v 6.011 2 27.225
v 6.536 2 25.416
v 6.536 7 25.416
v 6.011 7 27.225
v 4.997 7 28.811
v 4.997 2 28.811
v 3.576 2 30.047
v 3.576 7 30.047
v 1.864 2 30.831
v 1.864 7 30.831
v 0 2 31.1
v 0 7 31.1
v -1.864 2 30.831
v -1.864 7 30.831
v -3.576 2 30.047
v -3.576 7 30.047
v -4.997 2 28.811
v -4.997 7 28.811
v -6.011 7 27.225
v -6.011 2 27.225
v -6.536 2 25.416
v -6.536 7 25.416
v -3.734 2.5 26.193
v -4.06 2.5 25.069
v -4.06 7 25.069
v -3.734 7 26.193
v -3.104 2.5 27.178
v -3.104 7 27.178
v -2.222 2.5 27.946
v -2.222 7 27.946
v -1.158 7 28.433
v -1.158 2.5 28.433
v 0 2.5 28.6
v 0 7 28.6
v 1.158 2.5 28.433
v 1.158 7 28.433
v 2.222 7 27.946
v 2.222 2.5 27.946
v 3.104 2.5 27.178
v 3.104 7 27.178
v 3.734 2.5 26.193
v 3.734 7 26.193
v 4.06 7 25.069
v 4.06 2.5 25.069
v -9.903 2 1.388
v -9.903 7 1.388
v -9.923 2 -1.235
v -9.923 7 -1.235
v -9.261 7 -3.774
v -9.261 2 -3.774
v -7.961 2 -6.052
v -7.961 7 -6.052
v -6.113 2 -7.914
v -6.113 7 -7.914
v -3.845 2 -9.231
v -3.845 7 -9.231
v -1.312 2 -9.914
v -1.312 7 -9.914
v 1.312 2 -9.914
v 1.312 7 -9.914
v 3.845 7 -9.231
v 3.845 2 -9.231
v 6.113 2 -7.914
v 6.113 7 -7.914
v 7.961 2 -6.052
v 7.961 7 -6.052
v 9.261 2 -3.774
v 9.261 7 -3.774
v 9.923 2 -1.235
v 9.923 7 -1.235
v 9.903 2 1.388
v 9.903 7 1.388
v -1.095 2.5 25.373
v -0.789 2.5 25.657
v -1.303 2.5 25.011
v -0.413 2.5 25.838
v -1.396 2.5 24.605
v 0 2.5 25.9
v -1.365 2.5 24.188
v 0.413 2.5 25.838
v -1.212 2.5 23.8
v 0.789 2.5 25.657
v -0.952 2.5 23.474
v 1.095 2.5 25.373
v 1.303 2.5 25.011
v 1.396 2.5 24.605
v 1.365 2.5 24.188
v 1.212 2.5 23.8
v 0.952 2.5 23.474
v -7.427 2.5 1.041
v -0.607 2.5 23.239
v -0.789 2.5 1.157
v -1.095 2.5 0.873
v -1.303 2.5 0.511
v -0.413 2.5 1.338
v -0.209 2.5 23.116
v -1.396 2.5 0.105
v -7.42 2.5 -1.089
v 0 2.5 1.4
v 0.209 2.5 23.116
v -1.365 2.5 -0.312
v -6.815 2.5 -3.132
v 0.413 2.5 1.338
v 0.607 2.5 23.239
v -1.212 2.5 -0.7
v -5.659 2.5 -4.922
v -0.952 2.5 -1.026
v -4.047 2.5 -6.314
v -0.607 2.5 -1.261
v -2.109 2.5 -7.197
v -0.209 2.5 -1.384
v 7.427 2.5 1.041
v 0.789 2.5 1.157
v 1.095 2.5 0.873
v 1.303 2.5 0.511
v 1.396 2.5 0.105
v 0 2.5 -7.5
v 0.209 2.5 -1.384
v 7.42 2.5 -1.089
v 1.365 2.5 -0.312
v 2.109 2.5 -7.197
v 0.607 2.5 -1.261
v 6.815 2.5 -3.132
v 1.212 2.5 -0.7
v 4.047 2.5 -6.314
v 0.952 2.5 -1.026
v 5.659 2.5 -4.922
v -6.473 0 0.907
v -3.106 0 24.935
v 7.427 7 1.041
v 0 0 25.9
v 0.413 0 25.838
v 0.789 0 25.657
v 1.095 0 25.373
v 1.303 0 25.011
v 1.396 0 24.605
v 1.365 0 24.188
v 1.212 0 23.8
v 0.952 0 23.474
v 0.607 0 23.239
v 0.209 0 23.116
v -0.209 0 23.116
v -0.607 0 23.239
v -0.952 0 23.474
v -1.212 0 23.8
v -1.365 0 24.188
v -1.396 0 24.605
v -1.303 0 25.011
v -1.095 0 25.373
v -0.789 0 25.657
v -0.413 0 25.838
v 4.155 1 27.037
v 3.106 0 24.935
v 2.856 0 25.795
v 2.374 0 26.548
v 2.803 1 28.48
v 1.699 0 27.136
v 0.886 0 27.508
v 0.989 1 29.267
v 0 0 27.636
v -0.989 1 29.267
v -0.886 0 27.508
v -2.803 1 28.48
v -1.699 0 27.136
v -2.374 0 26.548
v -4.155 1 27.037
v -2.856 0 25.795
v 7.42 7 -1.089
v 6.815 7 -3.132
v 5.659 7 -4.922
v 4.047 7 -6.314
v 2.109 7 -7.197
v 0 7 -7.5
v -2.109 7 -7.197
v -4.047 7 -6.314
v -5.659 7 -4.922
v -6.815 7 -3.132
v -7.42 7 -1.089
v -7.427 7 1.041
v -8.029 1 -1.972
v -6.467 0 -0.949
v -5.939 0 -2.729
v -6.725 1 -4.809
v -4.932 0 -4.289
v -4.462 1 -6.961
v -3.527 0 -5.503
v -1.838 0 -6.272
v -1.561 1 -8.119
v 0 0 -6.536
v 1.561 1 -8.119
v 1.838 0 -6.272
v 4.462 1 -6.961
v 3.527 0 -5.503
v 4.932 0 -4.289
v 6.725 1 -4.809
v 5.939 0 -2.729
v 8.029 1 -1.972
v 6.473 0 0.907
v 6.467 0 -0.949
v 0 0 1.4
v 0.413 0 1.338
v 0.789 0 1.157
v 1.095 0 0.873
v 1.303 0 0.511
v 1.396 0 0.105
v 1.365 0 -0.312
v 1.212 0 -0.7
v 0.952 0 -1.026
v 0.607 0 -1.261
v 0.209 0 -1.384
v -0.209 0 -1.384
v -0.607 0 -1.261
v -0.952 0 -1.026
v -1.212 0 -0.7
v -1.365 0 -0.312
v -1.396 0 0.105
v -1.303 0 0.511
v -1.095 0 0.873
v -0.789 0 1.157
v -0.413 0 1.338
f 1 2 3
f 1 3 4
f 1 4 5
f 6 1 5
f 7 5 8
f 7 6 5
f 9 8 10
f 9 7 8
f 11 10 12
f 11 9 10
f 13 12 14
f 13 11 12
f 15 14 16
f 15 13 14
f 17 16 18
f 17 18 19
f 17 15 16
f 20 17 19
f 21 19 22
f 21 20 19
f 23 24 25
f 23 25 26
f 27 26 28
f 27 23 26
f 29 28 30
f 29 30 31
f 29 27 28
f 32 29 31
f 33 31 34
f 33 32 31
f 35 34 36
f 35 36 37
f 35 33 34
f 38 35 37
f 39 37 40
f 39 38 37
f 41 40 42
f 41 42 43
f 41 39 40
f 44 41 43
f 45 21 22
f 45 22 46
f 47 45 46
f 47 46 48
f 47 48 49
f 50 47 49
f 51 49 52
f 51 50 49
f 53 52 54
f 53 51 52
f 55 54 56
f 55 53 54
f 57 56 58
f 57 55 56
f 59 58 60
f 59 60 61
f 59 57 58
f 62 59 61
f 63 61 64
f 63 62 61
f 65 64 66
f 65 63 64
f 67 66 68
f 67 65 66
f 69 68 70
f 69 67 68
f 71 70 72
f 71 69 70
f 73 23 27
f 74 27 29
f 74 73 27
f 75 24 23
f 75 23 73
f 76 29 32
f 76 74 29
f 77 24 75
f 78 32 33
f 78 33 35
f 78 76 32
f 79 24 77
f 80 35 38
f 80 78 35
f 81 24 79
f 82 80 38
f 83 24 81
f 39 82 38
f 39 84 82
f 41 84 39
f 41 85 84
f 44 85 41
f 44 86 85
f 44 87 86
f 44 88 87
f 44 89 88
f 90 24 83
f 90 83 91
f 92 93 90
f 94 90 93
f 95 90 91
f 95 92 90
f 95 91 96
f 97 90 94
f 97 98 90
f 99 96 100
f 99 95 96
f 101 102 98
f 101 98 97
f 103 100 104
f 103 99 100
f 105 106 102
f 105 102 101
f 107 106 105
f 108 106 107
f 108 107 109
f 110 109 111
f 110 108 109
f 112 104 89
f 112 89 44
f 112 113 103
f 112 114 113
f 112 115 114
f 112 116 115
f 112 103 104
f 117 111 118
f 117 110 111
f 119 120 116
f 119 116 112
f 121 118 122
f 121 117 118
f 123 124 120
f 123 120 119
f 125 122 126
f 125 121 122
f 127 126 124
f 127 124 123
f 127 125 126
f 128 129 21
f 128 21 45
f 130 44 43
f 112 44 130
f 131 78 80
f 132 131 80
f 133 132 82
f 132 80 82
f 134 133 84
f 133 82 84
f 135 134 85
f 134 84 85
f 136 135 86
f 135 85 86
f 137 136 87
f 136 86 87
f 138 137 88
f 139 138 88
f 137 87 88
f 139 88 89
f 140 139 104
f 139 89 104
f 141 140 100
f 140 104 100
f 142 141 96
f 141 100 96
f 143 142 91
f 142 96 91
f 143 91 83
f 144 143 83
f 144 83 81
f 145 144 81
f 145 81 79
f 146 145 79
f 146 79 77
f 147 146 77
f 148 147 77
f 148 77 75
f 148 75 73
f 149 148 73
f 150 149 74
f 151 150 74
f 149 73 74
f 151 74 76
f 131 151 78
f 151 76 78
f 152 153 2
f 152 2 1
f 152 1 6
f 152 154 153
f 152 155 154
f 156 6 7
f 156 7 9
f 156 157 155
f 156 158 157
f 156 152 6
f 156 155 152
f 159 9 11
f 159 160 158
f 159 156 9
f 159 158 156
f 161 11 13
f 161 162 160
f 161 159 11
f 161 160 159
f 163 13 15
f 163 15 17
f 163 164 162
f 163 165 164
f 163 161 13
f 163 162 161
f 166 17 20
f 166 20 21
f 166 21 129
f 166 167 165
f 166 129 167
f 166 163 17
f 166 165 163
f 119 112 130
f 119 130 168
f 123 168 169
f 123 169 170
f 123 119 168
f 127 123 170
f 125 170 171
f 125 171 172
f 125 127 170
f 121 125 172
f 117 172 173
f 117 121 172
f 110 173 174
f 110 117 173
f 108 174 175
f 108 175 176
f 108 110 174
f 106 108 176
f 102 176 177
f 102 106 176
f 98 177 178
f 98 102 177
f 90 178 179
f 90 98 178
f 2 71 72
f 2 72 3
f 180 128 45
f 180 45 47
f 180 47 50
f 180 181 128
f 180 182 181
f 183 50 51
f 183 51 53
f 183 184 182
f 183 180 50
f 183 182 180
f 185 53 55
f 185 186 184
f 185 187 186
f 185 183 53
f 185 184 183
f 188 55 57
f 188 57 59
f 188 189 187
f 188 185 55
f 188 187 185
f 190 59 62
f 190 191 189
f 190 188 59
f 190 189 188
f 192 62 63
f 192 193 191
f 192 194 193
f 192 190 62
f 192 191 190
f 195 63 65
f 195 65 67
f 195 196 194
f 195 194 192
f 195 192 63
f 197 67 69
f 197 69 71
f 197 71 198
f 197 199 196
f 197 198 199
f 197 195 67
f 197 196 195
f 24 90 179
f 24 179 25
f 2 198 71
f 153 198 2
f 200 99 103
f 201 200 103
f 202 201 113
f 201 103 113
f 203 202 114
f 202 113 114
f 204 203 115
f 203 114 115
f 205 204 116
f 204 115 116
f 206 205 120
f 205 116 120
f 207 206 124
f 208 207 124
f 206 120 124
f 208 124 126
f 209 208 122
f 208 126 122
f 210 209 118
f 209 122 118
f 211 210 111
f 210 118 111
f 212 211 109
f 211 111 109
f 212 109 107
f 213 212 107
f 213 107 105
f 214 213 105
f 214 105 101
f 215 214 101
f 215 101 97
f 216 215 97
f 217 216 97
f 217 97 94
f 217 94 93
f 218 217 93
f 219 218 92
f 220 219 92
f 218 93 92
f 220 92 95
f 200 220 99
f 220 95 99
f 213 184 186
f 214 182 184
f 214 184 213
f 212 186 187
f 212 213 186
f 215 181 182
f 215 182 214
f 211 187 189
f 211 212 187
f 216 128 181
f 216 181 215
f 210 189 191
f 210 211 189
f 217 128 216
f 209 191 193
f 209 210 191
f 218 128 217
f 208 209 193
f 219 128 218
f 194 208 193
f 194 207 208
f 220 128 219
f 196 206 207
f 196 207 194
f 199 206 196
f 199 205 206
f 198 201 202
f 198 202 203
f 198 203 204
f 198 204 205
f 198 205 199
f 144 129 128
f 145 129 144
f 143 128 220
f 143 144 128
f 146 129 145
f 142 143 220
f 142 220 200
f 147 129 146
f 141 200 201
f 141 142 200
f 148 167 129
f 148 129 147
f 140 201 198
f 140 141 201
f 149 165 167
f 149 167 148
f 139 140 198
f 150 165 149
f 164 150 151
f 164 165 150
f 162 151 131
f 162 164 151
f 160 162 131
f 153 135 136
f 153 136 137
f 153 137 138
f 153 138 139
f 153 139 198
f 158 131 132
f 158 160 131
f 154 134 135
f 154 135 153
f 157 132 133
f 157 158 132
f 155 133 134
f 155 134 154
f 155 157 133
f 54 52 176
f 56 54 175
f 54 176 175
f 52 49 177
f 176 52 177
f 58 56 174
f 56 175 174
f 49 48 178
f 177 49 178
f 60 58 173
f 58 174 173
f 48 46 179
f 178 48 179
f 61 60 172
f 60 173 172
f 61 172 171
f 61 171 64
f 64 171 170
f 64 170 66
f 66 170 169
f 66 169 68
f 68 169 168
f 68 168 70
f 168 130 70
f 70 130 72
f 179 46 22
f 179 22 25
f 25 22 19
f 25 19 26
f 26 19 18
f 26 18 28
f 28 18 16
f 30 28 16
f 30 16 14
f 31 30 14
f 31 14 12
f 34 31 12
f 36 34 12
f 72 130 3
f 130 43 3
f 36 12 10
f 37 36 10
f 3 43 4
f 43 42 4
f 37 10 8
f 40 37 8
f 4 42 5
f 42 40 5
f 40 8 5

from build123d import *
from OCP.BRepFilletAPI import BRepFilletAPI_MakeChamfer

# Parameters (mm, degrees)
BOSS_EXTRUDE1_DEPTH = 2.5
BOSS_EXTRUDE2_DEPTH = 7
SKETCH3_R           = 1.4
CUT_EXTRUDE1_DEPTH  = 2.5
CHAMFER1_SIZE       = 2
CHAMFER1_SIZE2      = 3.464101615


with BuildPart() as part:
    # Sketch1 → Boss-Extrude1 (new body)
    with BuildSketch(Plane(origin=(0, 0, 0), x_dir=(1, 0, 0), z_dir=(0, 1, 0))):
        with BuildLine():
            Line((-7.427428988, -1.040816327), (-4.060327847, -25.068979592))
            ThreePointArc((-4.060327847, -25.068979592), (0, -28.6), (4.060327847, -25.068979592))
            Line((4.060327847, -25.068979592), (7.427428988, -1.040816327))
            ThreePointArc((7.427428988, -1.040816327), (0, 7.5), (-7.427428988, -1.040816327))
        make_face()
    extrude(amount=BOSS_EXTRUDE1_DEPTH)

    # Sketch2 → Boss-Extrude2 (add)
    with BuildSketch(Plane.XZ):
        with BuildLine():
            Line((9.903238651, 1.387755102), (6.53613751, 25.415918367))
            ThreePointArc((6.53613751, 25.415918367), (0, 31.1), (-6.53613751, 25.415918367))
            Line((-6.53613751, 25.415918367), (-9.903238651, 1.387755102))
            ThreePointArc((-9.903238651, 1.387755102), (0, -10), (9.903238651, 1.387755102))
        make_face()
        with BuildLine():
            Line((-7.427428988, 1.040816327), (-4.060327847, 25.068979592))
            ThreePointArc((-4.060327847, 25.068979592), (0, 28.6), (4.060327847, 25.068979592))
            Line((4.060327847, 25.068979592), (7.427428988, 1.040816327))
            ThreePointArc((7.427428988, 1.040816327), (0, -7.5), (-7.427428988, 1.040816327))
        make_face(mode=Mode.SUBTRACT)
    extrude(amount=-BOSS_EXTRUDE2_DEPTH)

    # Sketch3 → Cut-Extrude1 (cut)
    with BuildSketch(Plane(origin=(0, 2.5, 0), x_dir=(1, 0, 0), z_dir=(0, 1, 0))):
        with Locations(Location((0, 0, 0), (0, 0, 270))):
            Circle(SKETCH3_R)
        with Locations(Location((0, -24.5, 0), (0, 0, 270))):
            Circle(SKETCH3_R)
    extrude(amount=-CUT_EXTRUDE1_DEPTH, mode=Mode.SUBTRACT)

    # Chamfer1: one chamfer whose edges measure the first distance from different faces: ONE call of the kernel's chamfer builder (chamfer() names one face for all edges)
    chamfer1_edges_1 = [part.edges().sort_by_distance(p)[0] for p in [
        (0, 0, -10),
    ]]
    chamfer1_side_1 = [part.faces().sort_by_distance(p)[0] for p in [
        (0, 3.5, -10),
    ]]
    chamfer1_edges_2 = [part.edges().sort_by_distance(p)[0] for p in [
        (8.21968808, 0, 13.401836735),
    ]]
    chamfer1_side_2 = [part.faces().sort_by_distance(p)[0] for p in [
        (8.21968808, 3.5, 13.401836735),
    ]]
    chamfer1_edges_3 = [part.edges().sort_by_distance(p)[0] for p in [
        (0, 0, 31.1),
    ]]
    chamfer1_side_3 = [part.faces().sort_by_distance(p)[0] for p in [
        (0, 3.5, 31.1),
    ]]
    chamfer1_edges_4 = [part.edges().sort_by_distance(p)[0] for p in [
        (-8.21968808, 0, 13.401836735),
    ]]
    chamfer1_side_4 = [part.faces().sort_by_distance(p)[0] for p in [
        (-8.21968808, 3.5, 13.401836735),
    ]]
    chamfer1 = BRepFilletAPI_MakeChamfer(part.part.solid().wrapped)
    for e in chamfer1_edges_1:
        chamfer1.Add(CHAMFER1_SIZE, CHAMFER1_SIZE2, e.wrapped, chamfer1_side_1[0].wrapped)  # the first distance lies on this face
    for e in chamfer1_edges_2:
        chamfer1.Add(CHAMFER1_SIZE, CHAMFER1_SIZE2, e.wrapped, chamfer1_side_2[0].wrapped)  # the first distance lies on this face
    for e in chamfer1_edges_3:
        chamfer1.Add(CHAMFER1_SIZE, CHAMFER1_SIZE2, e.wrapped, chamfer1_side_3[0].wrapped)  # the first distance lies on this face
    for e in chamfer1_edges_4:
        chamfer1.Add(CHAMFER1_SIZE, CHAMFER1_SIZE2, e.wrapped, chamfer1_side_4[0].wrapped)  # the first distance lies on this face
    add(Compound.cast(chamfer1.Shape()), mode=Mode.REPLACE)


solid = part.part
